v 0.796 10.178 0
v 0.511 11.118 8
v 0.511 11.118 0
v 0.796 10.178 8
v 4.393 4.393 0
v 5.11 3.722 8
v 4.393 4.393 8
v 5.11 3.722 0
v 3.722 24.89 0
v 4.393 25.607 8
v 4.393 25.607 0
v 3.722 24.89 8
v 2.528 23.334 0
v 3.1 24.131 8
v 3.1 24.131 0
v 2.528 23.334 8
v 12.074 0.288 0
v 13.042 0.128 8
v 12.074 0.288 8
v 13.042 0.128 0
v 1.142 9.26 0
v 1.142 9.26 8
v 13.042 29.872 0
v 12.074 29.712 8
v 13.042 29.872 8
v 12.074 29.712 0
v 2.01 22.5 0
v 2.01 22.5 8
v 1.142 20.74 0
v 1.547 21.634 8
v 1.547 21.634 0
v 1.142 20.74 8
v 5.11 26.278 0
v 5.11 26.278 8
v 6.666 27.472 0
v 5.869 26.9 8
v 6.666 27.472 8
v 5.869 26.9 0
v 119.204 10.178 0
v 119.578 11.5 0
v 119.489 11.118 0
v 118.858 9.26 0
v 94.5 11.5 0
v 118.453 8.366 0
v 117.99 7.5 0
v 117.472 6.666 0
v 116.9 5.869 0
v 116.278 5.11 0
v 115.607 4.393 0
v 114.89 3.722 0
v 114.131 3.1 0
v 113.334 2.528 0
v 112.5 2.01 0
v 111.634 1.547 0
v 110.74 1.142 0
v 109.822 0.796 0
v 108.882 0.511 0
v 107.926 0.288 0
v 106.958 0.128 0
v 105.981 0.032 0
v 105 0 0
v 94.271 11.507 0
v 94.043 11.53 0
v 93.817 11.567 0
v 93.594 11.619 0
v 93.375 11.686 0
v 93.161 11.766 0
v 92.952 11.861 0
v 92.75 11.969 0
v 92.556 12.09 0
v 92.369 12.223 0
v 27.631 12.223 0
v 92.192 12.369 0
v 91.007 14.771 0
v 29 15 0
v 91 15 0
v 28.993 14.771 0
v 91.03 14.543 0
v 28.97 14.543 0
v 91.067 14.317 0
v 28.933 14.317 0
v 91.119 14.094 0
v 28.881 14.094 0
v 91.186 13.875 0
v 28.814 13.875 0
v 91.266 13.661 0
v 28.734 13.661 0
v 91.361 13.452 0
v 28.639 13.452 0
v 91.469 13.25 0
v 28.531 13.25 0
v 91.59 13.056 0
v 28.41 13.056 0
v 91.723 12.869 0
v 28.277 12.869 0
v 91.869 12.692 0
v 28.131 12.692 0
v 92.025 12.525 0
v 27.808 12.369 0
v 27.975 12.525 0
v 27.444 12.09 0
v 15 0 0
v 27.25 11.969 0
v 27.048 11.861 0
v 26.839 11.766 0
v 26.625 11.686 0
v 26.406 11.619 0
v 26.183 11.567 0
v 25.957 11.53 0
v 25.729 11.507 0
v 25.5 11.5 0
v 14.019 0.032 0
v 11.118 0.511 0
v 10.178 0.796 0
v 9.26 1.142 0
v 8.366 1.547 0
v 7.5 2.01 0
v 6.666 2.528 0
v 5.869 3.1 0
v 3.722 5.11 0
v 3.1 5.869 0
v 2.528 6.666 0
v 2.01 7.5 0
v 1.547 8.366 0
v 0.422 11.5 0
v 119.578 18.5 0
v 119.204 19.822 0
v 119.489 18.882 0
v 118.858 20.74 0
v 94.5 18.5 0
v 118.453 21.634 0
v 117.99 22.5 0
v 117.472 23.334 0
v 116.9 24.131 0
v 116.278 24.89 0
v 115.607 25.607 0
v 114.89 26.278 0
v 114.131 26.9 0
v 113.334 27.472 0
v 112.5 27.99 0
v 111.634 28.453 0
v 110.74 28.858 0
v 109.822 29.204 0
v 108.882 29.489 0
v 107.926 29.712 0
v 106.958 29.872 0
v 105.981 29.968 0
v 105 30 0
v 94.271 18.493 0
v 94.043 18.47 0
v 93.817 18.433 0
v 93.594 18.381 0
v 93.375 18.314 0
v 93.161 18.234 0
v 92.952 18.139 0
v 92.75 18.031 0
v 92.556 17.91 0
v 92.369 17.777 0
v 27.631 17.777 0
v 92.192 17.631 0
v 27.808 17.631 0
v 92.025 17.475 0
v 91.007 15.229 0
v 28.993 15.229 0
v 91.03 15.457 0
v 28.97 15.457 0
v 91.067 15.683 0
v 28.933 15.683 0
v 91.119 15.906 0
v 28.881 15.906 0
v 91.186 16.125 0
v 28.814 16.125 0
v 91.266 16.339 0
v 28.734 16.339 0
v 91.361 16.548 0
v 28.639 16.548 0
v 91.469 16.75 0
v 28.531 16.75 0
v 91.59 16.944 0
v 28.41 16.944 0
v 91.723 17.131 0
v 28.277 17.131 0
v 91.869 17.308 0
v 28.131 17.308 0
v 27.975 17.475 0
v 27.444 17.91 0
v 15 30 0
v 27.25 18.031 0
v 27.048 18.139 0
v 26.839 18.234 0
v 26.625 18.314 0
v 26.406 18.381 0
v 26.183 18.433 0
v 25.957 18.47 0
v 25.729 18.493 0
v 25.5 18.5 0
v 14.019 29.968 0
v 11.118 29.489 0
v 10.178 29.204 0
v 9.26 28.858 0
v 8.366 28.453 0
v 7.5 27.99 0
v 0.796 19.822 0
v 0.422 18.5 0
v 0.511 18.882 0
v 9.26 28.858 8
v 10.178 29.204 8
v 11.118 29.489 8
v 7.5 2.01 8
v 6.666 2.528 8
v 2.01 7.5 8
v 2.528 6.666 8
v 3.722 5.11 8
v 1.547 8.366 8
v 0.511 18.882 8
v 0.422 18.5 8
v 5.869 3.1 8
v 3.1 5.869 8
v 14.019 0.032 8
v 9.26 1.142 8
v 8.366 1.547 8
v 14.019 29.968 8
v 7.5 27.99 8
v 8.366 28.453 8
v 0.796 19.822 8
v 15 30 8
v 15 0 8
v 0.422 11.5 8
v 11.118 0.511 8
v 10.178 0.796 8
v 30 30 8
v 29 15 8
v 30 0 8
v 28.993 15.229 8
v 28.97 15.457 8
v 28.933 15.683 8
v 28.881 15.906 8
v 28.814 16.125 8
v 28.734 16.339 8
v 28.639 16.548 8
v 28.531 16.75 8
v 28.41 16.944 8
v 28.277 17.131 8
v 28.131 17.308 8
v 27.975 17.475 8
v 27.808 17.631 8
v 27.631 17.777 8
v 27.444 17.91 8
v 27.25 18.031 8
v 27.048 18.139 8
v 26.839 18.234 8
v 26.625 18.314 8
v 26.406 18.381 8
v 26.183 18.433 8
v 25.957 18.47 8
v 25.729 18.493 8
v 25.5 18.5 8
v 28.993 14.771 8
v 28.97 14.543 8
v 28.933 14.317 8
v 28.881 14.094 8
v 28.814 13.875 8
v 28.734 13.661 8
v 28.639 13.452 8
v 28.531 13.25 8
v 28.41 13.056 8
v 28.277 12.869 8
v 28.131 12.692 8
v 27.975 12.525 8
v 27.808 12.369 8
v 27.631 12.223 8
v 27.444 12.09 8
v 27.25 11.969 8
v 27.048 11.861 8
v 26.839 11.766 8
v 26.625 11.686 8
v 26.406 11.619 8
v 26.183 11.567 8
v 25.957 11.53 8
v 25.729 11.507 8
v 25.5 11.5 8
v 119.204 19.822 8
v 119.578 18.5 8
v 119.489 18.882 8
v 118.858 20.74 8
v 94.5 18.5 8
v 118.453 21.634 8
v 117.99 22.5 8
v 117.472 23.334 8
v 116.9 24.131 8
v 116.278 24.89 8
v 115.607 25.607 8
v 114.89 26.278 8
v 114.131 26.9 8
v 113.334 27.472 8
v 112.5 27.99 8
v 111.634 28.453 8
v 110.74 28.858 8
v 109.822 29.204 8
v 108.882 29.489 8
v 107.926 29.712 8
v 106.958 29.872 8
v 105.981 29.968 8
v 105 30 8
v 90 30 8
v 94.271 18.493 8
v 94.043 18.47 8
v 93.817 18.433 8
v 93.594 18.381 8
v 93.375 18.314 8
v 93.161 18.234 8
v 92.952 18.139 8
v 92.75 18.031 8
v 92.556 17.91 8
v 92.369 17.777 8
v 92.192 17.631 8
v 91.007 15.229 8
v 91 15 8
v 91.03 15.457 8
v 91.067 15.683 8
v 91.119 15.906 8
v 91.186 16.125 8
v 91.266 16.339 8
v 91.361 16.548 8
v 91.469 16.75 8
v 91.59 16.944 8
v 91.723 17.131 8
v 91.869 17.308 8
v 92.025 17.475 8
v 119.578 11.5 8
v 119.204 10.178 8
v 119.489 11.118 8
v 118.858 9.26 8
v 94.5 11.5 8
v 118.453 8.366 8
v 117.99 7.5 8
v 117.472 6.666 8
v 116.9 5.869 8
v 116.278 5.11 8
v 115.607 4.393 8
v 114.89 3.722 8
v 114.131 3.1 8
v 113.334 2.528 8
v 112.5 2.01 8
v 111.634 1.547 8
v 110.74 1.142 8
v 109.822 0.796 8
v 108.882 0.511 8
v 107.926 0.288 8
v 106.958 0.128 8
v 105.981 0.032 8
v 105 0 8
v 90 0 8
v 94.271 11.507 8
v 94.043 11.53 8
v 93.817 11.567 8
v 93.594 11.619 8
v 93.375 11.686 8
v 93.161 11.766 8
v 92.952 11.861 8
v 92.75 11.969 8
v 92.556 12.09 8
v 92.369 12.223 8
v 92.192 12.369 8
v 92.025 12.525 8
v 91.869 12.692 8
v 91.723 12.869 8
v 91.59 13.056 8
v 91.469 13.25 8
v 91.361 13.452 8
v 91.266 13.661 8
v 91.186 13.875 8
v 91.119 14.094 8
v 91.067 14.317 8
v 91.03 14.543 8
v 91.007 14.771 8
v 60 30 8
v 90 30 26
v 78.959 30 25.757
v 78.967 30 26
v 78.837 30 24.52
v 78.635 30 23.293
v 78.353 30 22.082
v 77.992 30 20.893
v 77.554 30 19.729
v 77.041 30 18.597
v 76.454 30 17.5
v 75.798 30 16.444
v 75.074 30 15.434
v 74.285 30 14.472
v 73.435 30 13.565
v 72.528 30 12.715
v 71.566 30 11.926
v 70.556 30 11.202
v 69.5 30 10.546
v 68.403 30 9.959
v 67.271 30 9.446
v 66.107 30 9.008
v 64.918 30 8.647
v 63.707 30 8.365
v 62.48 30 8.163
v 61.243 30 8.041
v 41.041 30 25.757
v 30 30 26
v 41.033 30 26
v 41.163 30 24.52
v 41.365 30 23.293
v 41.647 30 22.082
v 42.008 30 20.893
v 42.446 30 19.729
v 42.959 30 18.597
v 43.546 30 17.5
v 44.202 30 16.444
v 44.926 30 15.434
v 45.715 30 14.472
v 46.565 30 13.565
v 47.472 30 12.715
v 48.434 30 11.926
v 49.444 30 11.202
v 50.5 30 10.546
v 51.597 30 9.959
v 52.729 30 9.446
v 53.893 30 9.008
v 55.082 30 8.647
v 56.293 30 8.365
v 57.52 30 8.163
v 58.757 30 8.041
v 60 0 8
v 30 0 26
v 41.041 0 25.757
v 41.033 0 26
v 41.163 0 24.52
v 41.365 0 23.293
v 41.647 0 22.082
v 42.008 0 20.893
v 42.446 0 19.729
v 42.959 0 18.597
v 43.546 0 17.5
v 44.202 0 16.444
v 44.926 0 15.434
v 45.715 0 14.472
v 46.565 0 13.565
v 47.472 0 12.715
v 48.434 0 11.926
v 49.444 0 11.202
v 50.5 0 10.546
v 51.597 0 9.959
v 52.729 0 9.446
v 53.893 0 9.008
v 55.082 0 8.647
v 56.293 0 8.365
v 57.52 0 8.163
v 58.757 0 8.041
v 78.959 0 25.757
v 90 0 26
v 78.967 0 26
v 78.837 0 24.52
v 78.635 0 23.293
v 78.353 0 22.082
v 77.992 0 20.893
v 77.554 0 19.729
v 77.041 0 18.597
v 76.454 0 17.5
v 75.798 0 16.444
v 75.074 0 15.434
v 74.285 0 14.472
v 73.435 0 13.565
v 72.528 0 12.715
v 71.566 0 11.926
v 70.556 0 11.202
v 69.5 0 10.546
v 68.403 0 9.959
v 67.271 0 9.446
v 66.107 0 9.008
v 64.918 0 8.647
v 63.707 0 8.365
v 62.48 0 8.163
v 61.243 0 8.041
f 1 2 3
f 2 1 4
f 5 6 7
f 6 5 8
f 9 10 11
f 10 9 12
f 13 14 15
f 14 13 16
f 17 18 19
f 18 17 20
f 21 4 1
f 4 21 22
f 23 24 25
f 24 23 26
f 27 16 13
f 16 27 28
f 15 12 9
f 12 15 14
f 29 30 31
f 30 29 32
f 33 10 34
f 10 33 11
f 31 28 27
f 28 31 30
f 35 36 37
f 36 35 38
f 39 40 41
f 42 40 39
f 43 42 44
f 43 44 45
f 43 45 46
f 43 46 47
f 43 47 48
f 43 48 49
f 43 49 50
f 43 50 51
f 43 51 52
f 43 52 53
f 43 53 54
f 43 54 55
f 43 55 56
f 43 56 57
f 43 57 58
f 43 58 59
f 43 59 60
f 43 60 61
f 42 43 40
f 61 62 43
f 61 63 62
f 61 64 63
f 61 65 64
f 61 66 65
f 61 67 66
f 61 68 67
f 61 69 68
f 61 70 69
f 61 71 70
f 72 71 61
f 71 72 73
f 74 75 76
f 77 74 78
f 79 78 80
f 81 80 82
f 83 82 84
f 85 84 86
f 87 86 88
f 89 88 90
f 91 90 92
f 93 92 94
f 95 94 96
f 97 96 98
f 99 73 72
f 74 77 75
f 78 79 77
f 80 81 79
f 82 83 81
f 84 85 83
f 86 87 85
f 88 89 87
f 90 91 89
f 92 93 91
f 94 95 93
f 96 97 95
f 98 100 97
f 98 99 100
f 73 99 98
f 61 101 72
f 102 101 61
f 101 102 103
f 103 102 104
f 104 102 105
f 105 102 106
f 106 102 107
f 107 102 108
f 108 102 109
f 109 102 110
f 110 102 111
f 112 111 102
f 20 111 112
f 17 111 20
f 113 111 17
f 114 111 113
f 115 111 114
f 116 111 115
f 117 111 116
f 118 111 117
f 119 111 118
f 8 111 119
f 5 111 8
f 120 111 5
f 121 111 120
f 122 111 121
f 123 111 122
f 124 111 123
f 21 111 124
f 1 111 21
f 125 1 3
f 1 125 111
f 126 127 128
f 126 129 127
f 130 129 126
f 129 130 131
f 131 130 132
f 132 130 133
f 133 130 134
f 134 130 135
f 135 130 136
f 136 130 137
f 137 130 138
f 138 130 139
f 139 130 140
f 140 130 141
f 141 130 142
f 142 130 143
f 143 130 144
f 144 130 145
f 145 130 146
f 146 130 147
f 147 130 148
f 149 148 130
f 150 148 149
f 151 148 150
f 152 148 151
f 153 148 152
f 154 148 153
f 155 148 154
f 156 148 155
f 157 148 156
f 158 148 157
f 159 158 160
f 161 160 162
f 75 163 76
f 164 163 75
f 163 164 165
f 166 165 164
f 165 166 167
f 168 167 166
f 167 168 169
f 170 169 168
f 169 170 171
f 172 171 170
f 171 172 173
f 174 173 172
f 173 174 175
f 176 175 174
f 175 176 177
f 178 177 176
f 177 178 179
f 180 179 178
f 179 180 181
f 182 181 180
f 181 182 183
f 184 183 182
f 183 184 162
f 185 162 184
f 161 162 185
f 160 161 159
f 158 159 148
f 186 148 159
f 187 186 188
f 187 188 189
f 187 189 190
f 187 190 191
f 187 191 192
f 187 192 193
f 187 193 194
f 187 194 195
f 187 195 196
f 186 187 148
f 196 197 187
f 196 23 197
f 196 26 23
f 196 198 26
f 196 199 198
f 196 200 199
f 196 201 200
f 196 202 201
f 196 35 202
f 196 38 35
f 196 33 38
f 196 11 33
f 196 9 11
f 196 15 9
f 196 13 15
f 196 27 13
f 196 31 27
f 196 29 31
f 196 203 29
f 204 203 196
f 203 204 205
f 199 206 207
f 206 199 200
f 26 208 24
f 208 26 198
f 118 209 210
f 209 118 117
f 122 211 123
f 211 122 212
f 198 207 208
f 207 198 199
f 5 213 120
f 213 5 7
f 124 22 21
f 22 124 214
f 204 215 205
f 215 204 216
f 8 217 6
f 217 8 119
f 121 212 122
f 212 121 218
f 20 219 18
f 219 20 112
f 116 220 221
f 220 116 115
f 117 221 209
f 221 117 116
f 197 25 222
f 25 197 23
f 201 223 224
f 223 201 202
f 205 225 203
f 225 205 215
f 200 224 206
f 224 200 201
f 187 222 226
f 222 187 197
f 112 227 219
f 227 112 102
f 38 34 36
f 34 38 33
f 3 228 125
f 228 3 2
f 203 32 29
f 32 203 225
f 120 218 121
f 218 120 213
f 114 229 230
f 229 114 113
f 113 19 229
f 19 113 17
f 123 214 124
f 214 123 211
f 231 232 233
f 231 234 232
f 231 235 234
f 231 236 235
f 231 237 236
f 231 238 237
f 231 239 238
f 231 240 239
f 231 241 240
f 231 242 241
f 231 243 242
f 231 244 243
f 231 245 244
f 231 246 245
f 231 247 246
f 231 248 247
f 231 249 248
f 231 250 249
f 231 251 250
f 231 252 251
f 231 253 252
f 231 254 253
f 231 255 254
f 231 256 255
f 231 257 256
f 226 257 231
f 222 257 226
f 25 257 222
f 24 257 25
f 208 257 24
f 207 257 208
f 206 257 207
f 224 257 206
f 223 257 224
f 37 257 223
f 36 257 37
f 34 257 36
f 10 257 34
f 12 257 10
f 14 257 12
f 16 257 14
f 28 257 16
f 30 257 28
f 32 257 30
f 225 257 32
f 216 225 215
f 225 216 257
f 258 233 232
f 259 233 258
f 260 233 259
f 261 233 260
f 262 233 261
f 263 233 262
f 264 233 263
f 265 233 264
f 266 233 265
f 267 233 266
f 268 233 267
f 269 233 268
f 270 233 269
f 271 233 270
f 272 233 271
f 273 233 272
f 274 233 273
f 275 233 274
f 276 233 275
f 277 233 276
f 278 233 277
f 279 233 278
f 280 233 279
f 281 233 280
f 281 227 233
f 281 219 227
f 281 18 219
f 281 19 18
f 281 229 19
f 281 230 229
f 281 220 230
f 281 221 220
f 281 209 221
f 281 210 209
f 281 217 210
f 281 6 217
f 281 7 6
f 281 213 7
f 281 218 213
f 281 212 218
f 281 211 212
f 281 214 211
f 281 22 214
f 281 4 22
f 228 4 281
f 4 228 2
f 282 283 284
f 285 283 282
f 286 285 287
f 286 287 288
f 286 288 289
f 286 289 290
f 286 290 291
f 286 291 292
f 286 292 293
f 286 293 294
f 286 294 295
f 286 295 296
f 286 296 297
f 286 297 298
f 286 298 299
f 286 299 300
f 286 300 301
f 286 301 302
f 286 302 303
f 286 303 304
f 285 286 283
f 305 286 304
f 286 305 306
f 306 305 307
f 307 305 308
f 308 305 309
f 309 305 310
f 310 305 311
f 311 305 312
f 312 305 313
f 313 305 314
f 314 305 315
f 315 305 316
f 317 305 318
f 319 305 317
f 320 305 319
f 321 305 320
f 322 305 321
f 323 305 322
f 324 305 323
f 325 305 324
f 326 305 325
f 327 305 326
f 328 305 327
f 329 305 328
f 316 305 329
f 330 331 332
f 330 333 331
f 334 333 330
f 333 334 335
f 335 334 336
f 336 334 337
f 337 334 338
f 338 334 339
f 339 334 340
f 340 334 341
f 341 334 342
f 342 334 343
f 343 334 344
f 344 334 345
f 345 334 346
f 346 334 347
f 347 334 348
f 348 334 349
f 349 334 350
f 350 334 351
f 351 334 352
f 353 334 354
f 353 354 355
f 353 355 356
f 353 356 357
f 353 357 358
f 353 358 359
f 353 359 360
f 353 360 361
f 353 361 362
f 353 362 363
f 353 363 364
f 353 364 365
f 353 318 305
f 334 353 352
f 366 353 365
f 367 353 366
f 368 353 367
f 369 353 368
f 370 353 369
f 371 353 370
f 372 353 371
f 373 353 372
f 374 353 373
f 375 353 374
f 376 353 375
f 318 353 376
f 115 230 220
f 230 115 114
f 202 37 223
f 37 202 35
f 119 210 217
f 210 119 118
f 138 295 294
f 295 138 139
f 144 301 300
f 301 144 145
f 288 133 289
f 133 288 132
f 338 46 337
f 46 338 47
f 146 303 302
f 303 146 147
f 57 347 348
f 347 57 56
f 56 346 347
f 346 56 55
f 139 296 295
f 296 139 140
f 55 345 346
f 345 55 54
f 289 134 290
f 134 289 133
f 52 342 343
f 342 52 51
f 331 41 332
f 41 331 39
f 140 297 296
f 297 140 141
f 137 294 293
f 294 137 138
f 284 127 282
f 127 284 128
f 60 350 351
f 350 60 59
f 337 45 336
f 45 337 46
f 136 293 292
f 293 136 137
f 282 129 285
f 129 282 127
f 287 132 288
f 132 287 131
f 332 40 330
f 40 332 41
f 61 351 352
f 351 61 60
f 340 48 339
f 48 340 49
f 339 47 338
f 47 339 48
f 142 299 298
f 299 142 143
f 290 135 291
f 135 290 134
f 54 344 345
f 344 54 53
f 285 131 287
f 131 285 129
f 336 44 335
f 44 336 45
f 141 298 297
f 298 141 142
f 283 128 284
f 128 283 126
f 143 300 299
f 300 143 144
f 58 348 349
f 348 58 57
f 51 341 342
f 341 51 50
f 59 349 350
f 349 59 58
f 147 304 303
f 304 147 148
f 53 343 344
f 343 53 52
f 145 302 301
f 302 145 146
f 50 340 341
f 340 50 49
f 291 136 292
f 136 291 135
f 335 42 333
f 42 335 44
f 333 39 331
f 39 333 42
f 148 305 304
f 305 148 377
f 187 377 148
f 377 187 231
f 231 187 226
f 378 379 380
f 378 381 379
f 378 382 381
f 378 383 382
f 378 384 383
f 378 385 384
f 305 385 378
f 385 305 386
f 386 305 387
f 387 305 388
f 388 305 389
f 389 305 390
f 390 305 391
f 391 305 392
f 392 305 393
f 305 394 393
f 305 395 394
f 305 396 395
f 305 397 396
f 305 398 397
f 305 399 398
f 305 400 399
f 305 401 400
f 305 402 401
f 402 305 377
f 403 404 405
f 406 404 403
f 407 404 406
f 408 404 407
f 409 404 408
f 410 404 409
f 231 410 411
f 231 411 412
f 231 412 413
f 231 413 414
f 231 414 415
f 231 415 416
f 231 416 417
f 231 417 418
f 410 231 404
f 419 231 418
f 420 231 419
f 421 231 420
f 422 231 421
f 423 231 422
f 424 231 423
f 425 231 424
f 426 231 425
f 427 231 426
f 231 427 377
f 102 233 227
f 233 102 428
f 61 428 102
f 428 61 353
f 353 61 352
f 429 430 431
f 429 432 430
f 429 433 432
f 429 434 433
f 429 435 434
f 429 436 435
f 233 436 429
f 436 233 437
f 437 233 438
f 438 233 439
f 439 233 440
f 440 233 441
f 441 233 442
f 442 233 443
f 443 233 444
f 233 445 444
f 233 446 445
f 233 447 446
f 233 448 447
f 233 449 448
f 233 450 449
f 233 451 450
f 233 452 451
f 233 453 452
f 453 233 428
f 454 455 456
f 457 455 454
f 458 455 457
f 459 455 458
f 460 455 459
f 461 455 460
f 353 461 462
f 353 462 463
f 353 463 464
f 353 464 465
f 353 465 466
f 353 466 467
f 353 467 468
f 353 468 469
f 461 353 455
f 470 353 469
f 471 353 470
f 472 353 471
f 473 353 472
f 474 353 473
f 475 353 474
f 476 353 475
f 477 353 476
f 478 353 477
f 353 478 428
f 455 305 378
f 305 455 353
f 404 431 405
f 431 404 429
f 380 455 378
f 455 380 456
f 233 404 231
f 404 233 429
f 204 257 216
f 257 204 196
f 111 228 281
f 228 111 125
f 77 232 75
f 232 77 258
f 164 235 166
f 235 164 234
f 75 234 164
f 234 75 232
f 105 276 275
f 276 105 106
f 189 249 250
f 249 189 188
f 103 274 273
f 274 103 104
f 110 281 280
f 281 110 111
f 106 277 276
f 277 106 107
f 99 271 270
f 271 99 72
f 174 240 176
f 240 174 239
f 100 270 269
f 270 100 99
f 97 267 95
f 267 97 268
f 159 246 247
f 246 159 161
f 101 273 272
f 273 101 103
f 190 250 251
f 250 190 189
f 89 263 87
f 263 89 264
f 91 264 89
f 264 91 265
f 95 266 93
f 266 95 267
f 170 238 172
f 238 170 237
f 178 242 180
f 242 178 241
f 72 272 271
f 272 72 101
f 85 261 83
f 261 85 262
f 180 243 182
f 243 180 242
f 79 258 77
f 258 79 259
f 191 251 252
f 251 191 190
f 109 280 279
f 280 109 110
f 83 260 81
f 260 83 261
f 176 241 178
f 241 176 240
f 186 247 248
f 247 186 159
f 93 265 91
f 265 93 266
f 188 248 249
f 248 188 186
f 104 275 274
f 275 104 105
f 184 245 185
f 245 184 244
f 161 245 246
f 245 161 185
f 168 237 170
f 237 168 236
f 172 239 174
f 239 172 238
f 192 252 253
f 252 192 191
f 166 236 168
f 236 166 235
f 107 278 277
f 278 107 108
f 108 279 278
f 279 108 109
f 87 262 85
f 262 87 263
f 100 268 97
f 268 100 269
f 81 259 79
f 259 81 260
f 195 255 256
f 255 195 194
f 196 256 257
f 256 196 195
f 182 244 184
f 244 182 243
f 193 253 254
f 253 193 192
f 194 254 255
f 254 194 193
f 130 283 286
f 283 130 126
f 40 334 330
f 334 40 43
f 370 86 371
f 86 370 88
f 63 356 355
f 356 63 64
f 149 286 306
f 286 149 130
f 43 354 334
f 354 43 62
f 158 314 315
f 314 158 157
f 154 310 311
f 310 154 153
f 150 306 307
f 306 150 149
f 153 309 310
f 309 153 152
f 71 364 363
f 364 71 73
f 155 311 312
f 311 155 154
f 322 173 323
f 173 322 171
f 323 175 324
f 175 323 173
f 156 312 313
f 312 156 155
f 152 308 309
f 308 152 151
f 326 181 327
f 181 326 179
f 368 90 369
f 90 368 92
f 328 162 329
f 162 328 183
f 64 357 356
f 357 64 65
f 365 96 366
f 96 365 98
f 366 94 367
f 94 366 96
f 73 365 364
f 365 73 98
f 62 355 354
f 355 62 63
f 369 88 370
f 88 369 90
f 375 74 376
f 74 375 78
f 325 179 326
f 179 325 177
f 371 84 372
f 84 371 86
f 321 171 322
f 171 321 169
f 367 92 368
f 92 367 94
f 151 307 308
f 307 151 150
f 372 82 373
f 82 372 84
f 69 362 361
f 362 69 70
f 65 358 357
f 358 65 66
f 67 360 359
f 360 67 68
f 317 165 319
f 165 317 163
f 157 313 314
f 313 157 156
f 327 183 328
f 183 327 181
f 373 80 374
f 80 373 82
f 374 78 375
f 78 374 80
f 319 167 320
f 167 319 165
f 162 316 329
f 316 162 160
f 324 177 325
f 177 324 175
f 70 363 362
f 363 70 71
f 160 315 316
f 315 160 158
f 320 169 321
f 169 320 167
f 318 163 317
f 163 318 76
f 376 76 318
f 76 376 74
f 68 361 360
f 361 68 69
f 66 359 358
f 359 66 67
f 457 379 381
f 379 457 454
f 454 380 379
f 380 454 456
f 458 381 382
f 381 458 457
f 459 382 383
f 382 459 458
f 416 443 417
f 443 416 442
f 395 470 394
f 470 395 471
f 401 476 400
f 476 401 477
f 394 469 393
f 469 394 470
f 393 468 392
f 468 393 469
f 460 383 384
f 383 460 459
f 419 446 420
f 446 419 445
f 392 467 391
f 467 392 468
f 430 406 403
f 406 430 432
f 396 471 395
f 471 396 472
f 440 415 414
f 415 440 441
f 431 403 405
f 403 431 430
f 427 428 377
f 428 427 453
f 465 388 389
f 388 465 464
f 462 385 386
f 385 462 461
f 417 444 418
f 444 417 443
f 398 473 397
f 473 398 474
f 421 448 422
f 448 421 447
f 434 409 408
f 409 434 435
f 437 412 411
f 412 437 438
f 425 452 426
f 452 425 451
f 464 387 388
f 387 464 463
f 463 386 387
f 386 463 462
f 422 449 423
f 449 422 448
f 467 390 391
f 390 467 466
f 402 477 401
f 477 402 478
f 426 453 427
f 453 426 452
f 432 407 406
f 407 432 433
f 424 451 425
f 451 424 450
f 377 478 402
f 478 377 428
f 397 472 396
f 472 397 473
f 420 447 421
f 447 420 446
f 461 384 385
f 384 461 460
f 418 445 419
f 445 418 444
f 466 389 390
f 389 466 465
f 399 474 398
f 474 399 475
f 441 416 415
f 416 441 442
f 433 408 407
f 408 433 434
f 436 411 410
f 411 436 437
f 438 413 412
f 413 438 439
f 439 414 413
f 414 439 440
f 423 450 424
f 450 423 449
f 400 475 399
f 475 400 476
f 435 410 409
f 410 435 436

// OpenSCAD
// Parametric filament spool by Woale

// preview[view:south, tilt:top diagonal]

// Configuration parameters in mm
base_x                = 120;
base_y                = 30;
base_z                = 8;

body_x                = 60;
body_d                = 38;

mounting_bolt_r       = 7;

neg_offset            = 1;

$fn=48*2;


difference() {
    union() {
        // the base
        translate([base_y/2, base_y/2, 0])         cylinder(r=base_y/2, h=base_z);
        translate([base_x-base_y/2, base_y/2, 0])  cylinder(r=base_y/2, h=base_z);
        translate([base_y/2, 0, 0])                cube([base_x-base_y, base_y, base_z]);

        translate([(base_x-body_x)/2, 0, base_z])  cube([body_x, base_y, body_d/2-1]);
        
    }
    
    union() {
        translate([0, (base_y-mounting_bolt_r)/2, -neg_offset])
            cube([(base_x-body_x)/2-1-mounting_bolt_r/2, mounting_bolt_r, base_z+2*neg_offset]); 
        translate([(base_x-body_x)/2-1-mounting_bolt_r/2, (base_y-mounting_bolt_r)/2+mounting_bolt_r/2, -neg_offset])
            cylinder(r=mounting_bolt_r/2, h=base_z+2*neg_offset);
        
        translate([base_x-(base_x-body_x)/2+1+mounting_bolt_r/2, (base_y-mounting_bolt_r)/2, -neg_offset])
            cube([(base_x-body_x)/2-1-mounting_bolt_r/2, mounting_bolt_r, base_z+2*neg_offset]);
//        translate([base_y+body_x+1-mounting_bolt_r/2, (base_y-mounting_bolt_r)/2+mounting_bolt_r/2, -neg_offset])
        translate([base_x-(base_x-body_x)/2+1+mounting_bolt_r/2, (base_y-mounting_bolt_r)/2+mounting_bolt_r/2, -neg_offset])
            cylinder(r=mounting_bolt_r/2, h=base_z+2*neg_offset);

        translate([base_x/2, -neg_offset, base_z+body_d/2]) rotate([-90,0,0]) cylinder(d=body_d, h=base_y+2*neg_offset);
    }
}
